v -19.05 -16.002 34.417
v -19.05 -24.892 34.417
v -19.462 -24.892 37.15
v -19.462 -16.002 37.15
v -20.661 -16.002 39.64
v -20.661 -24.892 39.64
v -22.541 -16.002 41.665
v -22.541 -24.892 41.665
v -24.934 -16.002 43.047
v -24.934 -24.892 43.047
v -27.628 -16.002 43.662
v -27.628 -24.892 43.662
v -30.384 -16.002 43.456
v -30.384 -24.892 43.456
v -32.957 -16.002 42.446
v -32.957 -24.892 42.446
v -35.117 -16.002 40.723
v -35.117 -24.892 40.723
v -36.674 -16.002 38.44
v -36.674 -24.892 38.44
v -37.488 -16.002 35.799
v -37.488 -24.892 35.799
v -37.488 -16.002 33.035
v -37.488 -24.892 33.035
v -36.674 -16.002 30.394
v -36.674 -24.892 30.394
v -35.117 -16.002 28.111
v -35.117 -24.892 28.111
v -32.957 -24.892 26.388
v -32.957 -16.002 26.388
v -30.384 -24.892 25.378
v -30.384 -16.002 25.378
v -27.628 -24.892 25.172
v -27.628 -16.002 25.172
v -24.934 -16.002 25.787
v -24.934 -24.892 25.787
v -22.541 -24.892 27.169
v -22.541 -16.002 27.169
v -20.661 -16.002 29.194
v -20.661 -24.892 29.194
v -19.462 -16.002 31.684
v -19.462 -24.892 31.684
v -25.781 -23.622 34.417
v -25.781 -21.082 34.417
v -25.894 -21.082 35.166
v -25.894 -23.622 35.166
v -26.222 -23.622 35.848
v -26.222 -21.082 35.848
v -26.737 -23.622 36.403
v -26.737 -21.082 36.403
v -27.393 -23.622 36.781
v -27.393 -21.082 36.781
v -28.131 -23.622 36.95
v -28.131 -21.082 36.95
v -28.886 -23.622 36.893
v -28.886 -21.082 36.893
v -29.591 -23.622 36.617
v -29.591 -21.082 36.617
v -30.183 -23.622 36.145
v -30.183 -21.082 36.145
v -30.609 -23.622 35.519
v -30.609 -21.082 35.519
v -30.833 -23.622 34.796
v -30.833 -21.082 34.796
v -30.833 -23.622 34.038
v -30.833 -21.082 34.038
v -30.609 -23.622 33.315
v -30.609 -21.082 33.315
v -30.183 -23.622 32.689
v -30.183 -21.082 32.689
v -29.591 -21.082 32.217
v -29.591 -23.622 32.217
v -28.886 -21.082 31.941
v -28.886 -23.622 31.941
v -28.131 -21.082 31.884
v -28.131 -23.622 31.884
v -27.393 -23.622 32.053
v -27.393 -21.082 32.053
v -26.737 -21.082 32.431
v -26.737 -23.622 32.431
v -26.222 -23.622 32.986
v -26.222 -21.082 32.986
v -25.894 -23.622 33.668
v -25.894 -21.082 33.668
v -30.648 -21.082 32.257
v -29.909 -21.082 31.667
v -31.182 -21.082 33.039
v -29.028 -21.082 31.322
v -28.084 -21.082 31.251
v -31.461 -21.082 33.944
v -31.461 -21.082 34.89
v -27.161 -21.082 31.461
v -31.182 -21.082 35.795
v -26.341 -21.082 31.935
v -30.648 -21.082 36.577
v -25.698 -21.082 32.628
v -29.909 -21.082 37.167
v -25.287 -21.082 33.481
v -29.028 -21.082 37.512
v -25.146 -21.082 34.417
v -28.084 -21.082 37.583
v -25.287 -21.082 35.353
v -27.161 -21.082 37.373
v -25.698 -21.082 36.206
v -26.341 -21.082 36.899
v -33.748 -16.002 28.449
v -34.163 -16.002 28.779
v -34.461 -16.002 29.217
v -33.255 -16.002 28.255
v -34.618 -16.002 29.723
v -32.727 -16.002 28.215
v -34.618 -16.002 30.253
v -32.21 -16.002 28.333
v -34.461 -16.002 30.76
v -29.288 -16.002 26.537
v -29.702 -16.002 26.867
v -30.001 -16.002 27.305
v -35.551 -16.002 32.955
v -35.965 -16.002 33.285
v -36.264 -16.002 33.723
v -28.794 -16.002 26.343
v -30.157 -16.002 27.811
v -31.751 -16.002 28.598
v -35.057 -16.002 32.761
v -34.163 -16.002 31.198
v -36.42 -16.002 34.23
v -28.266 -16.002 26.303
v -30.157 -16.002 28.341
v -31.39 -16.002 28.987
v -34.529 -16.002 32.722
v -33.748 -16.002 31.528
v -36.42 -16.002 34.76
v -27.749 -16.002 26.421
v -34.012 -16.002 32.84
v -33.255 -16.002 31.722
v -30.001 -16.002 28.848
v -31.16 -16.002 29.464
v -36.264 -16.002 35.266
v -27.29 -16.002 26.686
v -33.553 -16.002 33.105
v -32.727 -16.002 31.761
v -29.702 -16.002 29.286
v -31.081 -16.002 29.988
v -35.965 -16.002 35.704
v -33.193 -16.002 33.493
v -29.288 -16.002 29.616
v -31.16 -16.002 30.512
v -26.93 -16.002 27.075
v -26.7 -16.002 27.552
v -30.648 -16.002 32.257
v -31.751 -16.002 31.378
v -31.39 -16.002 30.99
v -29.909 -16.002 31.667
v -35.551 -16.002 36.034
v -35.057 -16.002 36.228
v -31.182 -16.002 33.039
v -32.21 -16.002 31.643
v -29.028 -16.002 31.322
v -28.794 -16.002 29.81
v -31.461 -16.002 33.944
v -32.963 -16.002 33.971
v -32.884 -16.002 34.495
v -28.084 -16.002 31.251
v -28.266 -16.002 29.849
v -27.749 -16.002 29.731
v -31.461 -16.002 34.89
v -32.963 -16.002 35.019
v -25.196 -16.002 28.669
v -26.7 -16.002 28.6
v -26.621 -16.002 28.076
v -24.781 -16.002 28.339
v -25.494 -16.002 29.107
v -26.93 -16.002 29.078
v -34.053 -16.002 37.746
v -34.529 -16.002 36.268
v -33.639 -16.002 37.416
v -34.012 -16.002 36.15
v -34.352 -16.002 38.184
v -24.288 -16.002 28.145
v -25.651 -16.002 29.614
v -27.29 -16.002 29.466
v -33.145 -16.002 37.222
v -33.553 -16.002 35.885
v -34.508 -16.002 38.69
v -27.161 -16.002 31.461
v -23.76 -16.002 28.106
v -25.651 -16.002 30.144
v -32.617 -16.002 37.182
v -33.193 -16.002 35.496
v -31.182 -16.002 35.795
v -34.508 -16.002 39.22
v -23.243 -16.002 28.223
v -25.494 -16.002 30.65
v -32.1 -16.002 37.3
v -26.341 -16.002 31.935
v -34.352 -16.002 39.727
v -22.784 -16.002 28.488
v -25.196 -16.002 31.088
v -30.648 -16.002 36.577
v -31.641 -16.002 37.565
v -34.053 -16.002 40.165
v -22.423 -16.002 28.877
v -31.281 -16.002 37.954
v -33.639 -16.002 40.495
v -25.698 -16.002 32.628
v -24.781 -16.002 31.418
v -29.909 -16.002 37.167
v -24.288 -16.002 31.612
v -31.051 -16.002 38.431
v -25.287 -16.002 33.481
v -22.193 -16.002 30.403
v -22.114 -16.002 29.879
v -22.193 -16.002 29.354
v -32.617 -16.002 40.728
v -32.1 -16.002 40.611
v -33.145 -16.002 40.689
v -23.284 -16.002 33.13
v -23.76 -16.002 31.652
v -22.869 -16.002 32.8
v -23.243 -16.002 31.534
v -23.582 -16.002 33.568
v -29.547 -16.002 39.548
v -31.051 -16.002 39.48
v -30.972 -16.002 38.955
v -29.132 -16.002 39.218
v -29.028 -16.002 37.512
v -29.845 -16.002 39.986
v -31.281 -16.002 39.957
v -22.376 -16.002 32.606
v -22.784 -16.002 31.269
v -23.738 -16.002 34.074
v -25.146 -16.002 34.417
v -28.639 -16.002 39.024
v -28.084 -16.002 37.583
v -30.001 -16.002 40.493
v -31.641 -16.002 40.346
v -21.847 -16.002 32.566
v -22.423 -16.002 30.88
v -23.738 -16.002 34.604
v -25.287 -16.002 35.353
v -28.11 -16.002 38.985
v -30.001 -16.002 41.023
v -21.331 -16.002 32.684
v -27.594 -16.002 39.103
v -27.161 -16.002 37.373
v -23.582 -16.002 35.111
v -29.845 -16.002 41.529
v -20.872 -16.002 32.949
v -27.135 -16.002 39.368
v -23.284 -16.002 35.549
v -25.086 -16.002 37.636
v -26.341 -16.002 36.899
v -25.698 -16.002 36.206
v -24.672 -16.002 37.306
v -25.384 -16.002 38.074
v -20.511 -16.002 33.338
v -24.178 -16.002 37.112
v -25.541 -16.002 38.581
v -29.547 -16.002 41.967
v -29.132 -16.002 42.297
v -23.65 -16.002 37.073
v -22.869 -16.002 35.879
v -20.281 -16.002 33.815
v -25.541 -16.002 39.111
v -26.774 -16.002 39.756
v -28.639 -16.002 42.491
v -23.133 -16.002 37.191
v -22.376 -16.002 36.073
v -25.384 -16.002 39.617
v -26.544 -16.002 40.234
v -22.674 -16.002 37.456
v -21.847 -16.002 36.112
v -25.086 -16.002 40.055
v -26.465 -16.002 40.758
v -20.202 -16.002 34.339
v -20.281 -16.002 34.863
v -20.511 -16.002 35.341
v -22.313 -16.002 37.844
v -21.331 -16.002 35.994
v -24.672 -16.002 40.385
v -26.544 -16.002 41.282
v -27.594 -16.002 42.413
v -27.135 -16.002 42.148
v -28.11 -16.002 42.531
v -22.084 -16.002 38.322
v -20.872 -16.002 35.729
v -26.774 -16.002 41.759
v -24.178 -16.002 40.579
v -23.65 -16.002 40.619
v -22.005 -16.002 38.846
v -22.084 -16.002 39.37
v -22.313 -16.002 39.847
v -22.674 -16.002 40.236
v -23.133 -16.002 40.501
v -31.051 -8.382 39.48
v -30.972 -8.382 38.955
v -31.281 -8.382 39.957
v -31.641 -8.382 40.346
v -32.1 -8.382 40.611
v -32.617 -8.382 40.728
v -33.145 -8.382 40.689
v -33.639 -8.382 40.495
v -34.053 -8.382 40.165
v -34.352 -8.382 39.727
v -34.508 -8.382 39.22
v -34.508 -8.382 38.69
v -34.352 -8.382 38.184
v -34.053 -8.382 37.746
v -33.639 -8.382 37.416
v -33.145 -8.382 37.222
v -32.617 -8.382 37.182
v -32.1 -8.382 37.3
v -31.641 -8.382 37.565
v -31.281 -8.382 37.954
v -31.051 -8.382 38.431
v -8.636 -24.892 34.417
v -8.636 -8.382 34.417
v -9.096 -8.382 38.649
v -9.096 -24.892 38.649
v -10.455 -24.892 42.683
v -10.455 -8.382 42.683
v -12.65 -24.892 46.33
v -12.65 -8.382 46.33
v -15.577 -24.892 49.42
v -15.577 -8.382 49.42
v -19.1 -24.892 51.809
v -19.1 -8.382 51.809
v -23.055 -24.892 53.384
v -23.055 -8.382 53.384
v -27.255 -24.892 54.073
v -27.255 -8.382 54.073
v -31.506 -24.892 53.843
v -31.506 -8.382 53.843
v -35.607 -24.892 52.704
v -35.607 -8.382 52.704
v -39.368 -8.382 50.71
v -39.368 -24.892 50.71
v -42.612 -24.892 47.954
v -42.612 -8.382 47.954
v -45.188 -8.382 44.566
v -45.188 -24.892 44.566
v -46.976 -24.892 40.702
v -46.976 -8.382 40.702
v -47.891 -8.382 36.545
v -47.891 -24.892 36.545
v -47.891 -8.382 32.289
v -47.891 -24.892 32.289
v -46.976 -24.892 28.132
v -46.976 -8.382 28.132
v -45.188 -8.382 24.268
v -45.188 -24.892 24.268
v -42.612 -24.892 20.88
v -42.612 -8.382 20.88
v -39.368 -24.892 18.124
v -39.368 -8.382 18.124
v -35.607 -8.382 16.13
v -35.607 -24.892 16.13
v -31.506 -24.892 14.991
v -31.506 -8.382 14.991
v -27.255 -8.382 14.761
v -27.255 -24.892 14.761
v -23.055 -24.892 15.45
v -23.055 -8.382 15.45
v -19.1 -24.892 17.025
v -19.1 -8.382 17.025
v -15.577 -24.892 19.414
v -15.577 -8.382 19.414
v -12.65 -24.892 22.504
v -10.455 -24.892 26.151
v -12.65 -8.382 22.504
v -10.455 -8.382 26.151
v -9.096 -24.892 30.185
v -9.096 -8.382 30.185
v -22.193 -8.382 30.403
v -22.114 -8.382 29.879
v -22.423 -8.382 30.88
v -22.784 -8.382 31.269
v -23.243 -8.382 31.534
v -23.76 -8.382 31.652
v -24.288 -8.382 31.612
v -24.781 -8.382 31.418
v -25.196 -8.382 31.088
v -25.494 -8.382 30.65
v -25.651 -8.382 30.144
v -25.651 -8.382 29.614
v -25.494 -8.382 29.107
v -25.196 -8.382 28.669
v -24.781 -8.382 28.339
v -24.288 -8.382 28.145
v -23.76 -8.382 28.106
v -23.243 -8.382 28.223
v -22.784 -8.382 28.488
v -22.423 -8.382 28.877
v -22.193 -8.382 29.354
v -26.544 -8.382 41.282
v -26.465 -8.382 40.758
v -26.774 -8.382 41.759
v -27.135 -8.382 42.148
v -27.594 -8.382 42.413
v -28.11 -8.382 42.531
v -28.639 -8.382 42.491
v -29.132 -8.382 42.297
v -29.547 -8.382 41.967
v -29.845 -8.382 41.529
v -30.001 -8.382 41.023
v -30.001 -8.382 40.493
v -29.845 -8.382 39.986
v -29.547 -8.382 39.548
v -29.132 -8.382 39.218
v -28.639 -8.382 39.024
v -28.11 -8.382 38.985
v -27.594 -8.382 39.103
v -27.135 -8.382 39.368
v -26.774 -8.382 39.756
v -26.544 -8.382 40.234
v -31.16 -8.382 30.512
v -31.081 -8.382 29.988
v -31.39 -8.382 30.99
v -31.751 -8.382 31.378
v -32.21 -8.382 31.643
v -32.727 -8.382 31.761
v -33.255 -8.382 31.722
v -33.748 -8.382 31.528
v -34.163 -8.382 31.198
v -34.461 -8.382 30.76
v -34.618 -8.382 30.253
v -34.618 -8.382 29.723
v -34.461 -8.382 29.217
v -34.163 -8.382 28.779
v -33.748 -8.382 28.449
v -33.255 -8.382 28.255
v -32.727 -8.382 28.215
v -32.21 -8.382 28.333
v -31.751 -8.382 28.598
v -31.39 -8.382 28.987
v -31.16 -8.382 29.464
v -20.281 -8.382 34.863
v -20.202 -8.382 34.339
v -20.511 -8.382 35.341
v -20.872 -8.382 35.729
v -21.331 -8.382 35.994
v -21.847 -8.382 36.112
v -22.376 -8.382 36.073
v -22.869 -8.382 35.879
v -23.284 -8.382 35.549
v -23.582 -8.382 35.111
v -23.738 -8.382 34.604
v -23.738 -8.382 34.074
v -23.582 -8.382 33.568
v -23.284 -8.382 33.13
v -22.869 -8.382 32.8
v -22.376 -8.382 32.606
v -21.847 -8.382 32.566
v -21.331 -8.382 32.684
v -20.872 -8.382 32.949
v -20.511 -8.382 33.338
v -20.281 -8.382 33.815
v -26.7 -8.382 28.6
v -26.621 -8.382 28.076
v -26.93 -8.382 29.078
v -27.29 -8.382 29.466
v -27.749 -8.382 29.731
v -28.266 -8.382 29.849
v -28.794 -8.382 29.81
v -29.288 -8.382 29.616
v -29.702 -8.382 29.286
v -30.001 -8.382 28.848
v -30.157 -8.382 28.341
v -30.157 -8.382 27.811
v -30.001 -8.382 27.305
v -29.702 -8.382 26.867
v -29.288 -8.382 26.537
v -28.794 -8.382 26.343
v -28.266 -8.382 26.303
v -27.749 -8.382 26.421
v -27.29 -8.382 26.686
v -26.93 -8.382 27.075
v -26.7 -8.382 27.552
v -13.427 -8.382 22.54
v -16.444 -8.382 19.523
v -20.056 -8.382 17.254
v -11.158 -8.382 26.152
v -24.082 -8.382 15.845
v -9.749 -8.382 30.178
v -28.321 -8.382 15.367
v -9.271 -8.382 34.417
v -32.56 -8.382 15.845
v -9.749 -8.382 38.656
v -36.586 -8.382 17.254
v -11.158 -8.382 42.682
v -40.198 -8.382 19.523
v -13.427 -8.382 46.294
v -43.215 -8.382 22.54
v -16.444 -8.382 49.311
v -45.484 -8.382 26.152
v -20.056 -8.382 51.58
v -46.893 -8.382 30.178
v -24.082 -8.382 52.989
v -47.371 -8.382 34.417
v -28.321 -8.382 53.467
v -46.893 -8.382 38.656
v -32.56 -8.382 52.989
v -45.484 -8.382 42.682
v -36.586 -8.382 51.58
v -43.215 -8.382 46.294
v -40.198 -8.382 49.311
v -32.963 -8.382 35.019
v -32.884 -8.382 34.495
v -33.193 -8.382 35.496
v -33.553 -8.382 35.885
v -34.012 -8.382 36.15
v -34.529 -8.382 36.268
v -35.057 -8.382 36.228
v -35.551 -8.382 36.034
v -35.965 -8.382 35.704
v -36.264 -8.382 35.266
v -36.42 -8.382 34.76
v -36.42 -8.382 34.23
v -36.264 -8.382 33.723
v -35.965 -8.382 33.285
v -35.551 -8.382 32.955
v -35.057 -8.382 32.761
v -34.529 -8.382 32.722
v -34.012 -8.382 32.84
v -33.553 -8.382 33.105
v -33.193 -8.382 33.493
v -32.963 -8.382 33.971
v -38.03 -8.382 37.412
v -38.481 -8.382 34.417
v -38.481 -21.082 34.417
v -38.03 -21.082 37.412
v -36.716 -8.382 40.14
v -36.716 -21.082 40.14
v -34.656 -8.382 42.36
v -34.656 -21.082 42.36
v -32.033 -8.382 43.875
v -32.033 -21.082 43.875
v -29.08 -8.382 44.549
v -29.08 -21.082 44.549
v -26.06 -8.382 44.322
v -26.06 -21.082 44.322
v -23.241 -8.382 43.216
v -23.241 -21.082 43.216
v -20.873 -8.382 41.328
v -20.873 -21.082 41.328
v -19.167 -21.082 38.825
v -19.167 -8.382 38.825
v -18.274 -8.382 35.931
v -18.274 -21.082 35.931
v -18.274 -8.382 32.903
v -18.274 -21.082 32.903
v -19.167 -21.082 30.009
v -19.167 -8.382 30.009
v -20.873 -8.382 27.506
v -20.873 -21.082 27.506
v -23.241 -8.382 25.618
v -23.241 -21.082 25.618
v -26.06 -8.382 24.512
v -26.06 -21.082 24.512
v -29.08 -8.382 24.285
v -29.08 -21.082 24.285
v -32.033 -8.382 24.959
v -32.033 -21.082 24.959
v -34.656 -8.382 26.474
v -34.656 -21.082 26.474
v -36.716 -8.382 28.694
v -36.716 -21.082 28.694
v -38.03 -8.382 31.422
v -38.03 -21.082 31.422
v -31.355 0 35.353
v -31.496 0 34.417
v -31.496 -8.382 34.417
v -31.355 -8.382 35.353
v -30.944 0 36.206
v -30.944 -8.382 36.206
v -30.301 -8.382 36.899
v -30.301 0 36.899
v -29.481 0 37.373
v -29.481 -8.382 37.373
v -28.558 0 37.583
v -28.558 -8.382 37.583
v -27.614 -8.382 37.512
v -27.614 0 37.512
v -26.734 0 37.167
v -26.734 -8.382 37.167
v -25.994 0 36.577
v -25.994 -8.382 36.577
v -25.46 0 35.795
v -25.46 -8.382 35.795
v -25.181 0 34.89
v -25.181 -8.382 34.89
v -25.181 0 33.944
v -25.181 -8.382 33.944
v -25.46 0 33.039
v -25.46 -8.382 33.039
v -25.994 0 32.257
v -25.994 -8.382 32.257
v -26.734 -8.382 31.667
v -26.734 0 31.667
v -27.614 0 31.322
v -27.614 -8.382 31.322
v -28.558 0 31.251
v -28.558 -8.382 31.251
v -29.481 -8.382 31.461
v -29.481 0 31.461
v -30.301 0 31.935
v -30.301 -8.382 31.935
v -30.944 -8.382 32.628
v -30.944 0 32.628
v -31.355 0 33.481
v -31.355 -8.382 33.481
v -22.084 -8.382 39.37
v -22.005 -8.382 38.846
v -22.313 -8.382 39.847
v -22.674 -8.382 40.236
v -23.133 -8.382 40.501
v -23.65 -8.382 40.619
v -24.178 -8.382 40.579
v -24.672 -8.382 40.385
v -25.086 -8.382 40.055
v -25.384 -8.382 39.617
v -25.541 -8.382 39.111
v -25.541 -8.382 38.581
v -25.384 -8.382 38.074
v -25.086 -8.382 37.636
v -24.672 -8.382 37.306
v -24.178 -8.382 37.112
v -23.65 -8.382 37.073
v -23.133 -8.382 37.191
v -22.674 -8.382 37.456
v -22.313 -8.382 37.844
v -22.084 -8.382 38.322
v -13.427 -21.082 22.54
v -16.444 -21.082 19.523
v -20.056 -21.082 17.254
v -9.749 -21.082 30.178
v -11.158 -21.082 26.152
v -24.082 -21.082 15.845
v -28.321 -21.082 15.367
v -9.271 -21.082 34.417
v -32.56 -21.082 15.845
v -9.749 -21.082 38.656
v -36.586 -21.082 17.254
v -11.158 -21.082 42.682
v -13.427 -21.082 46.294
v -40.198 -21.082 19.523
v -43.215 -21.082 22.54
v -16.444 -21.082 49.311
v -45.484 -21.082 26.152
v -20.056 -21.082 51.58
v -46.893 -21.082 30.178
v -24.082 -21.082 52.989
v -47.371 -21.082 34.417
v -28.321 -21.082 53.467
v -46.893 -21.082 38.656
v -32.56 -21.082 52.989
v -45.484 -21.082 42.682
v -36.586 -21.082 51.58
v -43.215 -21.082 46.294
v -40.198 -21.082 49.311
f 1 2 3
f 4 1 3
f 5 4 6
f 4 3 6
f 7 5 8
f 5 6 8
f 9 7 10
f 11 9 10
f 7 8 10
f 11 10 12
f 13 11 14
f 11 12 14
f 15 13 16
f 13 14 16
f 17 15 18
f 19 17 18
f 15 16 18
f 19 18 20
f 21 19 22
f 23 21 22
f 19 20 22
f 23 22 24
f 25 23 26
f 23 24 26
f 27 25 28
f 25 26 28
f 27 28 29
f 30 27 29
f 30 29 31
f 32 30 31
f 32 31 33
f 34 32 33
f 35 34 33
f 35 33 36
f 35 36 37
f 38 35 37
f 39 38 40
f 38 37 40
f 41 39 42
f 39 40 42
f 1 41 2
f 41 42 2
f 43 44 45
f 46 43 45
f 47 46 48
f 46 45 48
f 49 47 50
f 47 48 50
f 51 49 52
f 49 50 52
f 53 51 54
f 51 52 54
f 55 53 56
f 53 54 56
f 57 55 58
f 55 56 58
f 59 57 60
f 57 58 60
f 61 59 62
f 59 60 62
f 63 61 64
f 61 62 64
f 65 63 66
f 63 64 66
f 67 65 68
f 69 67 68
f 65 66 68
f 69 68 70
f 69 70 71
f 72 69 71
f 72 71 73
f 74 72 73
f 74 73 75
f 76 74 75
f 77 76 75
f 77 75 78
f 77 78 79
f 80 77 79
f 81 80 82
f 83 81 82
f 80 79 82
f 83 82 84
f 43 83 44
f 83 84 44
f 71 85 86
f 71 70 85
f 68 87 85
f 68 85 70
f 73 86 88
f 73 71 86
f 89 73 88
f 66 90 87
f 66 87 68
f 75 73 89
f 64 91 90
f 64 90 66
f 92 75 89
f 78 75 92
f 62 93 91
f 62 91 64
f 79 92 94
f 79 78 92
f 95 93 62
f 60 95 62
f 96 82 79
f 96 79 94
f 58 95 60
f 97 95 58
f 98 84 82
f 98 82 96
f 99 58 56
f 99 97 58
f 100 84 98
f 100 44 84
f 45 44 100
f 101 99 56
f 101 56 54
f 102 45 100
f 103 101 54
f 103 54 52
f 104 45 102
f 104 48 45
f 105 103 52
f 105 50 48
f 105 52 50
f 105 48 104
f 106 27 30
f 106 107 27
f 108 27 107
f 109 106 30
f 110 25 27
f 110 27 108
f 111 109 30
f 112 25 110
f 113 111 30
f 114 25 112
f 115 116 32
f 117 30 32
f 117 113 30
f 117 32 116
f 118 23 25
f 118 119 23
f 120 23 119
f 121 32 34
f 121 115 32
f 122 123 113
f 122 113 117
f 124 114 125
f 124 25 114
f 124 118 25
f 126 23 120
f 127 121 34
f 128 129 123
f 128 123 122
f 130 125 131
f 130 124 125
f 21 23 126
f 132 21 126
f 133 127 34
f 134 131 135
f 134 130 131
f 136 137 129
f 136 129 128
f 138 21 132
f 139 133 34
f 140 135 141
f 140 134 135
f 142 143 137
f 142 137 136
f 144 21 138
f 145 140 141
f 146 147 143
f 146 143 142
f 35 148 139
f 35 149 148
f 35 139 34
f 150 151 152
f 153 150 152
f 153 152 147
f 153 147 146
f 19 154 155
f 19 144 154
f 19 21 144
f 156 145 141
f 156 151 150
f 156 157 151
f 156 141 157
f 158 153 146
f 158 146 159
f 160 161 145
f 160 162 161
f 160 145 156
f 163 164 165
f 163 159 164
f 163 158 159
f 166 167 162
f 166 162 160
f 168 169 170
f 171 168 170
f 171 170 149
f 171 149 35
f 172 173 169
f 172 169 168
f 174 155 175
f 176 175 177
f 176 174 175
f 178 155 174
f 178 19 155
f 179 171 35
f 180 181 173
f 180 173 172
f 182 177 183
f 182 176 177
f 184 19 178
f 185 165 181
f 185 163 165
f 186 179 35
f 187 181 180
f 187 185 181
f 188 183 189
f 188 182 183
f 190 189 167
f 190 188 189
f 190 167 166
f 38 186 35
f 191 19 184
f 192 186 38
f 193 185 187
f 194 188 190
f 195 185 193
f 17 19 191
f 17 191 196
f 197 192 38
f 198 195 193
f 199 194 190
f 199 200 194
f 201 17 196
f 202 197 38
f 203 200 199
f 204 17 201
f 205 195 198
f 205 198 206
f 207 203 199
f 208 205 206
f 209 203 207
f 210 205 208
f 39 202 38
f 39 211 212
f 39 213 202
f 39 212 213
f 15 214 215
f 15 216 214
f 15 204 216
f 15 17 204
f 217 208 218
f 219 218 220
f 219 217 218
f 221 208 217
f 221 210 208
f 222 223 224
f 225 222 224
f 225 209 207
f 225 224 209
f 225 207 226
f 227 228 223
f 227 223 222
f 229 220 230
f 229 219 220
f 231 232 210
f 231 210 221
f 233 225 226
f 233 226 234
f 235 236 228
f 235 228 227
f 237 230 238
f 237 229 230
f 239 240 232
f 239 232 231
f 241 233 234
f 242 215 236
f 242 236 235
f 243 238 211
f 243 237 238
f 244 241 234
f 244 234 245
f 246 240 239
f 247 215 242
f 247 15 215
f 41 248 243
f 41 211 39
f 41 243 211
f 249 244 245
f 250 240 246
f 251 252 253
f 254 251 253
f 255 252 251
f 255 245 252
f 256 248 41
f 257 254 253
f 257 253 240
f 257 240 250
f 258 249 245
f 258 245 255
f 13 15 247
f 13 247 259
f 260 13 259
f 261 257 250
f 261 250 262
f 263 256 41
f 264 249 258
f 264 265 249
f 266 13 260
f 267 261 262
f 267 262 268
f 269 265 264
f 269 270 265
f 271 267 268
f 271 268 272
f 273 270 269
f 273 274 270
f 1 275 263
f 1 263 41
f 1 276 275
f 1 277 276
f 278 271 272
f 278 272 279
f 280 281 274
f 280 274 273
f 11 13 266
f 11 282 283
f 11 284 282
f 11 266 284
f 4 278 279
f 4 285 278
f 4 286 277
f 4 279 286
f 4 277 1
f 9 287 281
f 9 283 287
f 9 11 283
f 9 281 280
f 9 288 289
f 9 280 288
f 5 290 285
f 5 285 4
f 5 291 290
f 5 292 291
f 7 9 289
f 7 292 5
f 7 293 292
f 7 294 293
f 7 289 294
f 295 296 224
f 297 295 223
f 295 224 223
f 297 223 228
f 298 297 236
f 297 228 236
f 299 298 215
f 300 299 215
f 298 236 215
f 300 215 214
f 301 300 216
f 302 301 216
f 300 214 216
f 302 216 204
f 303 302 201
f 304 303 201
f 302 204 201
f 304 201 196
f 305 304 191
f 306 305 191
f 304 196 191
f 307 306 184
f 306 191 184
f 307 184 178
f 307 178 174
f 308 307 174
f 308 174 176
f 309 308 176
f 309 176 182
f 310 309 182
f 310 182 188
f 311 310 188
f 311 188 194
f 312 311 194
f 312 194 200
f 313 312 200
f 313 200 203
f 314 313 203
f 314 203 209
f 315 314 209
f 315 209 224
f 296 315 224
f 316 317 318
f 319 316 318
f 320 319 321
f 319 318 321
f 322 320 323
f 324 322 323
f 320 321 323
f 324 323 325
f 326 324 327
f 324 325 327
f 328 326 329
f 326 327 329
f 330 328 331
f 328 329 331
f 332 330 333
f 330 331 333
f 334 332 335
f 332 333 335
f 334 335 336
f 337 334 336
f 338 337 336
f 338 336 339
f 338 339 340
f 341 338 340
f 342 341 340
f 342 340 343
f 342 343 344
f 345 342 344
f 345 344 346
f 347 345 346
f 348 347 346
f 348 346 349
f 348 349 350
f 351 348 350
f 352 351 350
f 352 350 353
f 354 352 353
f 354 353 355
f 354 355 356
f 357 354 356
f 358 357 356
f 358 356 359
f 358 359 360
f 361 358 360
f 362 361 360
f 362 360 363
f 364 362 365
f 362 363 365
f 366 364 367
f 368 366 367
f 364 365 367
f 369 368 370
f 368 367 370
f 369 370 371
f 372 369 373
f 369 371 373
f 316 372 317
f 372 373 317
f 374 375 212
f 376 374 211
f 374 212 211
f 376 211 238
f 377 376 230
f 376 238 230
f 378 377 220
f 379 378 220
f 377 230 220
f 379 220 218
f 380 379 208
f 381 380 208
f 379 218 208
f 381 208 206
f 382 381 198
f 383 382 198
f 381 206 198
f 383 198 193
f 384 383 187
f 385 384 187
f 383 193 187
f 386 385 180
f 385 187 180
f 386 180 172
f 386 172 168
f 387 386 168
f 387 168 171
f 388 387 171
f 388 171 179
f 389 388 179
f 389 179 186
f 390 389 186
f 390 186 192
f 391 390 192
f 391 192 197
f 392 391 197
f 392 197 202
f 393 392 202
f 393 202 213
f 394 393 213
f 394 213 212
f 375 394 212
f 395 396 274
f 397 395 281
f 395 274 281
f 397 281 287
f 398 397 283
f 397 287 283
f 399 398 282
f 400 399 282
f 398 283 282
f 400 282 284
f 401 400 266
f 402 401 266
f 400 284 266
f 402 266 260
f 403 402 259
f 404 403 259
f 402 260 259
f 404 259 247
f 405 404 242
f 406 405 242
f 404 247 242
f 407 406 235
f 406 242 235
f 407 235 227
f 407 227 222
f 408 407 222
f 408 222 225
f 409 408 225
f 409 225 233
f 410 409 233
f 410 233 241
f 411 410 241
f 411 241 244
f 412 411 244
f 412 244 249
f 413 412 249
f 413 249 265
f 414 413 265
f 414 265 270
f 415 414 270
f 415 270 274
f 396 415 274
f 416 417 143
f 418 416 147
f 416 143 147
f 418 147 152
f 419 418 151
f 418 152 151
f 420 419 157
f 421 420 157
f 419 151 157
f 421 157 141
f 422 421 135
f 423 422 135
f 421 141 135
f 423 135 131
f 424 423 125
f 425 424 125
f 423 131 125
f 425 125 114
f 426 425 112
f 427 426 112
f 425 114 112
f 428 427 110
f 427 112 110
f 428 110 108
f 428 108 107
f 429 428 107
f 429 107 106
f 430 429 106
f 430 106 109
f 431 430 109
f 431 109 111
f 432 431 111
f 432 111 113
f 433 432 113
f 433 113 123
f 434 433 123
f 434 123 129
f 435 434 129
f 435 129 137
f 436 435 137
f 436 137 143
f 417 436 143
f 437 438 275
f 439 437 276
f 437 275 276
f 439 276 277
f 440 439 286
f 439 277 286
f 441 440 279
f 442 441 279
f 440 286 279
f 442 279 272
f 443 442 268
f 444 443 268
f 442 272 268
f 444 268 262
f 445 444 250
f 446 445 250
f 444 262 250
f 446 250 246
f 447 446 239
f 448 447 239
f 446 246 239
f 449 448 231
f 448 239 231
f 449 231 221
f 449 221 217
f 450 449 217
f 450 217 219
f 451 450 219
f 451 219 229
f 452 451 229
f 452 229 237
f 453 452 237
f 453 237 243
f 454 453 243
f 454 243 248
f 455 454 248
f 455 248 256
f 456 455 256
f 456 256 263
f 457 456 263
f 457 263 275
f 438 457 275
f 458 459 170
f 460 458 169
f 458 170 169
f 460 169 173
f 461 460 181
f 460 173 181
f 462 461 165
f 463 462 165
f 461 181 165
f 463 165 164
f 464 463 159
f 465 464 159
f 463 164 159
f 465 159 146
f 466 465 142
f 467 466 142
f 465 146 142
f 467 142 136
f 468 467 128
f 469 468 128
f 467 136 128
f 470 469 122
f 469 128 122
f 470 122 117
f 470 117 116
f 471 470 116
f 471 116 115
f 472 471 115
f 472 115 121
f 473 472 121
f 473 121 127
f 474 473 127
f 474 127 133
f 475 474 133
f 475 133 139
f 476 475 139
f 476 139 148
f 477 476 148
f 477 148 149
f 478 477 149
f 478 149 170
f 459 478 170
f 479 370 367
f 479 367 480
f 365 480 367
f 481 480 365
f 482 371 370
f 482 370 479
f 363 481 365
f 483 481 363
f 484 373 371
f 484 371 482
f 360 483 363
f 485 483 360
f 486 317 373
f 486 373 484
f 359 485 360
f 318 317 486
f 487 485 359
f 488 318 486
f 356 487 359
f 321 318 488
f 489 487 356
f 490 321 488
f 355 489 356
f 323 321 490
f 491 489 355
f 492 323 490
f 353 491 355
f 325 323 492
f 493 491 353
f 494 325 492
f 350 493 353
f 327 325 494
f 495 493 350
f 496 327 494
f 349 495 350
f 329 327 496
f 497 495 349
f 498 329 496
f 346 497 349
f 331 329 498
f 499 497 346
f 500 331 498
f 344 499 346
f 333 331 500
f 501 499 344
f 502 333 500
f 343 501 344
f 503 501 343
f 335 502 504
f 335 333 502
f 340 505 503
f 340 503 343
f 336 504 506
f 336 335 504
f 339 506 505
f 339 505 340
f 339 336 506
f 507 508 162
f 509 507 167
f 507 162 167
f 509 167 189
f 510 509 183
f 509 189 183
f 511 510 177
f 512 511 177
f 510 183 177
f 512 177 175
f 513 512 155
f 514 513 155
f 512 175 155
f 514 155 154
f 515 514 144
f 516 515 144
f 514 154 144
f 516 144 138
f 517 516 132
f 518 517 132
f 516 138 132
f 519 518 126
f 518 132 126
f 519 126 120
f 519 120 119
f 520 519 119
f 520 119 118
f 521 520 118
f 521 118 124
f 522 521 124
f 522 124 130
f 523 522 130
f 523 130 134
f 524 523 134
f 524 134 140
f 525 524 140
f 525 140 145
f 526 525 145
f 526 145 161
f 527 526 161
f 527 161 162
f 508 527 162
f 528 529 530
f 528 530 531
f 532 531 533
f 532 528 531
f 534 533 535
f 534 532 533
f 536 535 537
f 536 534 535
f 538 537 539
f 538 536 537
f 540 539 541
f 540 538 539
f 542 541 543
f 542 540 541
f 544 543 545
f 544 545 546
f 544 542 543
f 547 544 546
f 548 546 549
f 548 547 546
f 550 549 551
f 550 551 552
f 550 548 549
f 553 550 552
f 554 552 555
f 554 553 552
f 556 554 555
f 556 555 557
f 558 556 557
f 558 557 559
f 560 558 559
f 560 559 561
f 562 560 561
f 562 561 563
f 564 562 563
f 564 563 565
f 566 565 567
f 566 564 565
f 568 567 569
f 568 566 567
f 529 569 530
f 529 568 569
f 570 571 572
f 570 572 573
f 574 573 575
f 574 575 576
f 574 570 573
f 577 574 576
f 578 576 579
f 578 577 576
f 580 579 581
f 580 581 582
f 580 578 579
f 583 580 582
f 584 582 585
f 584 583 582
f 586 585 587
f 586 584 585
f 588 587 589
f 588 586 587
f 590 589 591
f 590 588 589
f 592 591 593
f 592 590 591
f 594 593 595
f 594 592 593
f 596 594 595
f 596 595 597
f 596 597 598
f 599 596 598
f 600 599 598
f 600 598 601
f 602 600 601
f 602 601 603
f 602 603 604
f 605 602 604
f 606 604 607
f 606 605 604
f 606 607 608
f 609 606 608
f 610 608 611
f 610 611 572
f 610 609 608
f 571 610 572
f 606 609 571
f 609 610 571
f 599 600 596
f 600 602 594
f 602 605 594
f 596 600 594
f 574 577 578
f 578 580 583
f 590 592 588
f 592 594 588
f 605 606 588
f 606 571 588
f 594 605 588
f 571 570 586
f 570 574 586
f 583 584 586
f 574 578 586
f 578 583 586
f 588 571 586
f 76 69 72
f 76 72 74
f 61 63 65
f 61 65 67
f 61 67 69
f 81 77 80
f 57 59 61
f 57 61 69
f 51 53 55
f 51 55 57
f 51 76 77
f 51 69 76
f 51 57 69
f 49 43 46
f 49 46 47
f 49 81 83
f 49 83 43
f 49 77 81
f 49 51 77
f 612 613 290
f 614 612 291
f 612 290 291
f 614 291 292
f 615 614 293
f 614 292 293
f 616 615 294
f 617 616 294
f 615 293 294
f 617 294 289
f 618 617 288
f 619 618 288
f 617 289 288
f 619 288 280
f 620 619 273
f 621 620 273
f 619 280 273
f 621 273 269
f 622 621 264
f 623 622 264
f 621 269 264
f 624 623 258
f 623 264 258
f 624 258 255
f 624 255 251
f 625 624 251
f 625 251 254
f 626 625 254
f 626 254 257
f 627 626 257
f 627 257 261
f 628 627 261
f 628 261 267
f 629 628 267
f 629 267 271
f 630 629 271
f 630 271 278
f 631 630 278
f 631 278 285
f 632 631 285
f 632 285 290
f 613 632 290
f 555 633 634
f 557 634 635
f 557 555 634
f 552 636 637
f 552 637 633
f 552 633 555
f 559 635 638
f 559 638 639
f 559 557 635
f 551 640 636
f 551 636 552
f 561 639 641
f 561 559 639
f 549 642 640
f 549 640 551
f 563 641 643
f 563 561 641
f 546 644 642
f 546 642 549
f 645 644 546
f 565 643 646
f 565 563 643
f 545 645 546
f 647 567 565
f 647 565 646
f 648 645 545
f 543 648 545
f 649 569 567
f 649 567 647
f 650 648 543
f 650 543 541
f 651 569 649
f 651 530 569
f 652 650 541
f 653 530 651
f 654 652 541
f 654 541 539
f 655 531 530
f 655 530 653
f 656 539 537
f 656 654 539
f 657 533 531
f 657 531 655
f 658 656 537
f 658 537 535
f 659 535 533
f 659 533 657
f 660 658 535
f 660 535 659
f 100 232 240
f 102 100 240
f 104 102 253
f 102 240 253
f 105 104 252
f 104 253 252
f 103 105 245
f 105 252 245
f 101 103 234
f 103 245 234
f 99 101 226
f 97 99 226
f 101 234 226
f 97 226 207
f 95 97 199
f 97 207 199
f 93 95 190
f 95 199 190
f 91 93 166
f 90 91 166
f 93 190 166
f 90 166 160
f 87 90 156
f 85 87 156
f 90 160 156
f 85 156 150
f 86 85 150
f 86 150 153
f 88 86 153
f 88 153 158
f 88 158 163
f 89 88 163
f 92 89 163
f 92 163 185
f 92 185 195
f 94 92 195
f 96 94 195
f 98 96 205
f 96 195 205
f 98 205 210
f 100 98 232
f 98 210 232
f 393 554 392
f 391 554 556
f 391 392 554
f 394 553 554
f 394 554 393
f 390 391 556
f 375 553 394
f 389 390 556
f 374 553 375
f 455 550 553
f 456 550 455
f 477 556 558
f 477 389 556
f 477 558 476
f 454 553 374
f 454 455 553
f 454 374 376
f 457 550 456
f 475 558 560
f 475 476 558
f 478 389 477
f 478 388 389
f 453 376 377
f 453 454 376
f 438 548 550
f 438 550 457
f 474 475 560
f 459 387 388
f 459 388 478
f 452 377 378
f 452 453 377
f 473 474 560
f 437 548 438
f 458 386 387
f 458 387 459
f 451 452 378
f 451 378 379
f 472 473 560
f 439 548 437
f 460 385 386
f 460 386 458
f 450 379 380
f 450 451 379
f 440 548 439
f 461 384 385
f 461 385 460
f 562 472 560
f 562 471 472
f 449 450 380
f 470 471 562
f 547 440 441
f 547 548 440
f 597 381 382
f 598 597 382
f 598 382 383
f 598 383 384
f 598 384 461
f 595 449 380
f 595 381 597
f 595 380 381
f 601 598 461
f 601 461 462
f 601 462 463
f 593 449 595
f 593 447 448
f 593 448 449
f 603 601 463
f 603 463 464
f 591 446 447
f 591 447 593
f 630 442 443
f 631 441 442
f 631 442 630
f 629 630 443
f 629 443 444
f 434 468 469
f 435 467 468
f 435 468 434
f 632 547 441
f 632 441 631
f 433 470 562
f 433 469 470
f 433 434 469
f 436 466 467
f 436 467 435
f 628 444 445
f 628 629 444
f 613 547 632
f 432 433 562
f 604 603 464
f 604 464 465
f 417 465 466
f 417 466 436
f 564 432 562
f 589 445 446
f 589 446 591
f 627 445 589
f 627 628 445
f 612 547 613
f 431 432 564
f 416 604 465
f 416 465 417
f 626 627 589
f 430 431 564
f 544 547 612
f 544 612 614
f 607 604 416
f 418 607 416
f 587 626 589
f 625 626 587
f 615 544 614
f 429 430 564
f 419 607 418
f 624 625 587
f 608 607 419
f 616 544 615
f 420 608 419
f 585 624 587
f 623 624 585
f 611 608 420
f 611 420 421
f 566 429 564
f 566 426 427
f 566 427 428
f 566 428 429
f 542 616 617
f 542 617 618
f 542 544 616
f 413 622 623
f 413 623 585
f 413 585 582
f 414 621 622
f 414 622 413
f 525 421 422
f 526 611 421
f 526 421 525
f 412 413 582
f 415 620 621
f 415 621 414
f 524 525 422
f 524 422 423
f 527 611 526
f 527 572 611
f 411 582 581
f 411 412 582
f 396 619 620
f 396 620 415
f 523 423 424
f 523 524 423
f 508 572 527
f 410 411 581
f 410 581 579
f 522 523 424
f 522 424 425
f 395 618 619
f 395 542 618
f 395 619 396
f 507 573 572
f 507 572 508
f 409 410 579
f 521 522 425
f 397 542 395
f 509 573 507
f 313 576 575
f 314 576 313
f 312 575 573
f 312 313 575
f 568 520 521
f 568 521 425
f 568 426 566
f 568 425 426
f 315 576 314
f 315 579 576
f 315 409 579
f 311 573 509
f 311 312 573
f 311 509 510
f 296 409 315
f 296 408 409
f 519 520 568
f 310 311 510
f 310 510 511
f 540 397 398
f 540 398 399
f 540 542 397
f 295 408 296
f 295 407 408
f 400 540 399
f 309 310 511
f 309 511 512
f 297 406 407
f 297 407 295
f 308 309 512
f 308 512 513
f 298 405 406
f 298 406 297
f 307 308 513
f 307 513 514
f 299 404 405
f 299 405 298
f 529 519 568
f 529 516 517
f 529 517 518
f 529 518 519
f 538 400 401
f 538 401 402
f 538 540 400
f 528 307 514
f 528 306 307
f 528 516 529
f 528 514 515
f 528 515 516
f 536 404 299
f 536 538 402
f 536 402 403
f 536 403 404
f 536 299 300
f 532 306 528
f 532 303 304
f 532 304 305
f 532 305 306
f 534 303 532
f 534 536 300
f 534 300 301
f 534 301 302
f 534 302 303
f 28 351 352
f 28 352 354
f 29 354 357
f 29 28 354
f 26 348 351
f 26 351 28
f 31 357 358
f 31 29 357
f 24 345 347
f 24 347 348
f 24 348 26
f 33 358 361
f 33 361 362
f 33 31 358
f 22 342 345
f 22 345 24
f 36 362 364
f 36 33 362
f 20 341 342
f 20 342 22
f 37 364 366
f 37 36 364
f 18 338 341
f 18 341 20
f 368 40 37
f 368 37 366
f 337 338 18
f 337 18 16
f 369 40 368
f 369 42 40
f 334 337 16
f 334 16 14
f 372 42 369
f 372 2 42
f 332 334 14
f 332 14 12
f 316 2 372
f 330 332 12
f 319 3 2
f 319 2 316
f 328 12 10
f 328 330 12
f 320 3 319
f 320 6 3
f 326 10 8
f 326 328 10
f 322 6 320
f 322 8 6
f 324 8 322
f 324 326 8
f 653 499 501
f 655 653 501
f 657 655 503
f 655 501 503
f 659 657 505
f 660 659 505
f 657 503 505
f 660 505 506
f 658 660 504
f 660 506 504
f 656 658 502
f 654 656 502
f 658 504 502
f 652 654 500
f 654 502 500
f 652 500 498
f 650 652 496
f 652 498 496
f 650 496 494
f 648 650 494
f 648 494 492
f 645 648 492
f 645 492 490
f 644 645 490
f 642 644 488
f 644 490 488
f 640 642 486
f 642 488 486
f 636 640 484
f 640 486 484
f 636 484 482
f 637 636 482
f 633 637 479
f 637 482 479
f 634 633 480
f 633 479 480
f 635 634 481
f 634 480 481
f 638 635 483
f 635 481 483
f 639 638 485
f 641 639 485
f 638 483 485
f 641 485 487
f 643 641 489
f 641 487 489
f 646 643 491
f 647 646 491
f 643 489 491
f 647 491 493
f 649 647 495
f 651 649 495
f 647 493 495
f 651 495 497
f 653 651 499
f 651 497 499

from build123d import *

# Parameters (mm, degrees)
F0_R      = 19.685
F0_R_2    = 10.16
F0_R_3    = 8.89
F1_DEPTH  = 24.892
F2_R      = 19.685
F2_R_2    = 3.175
F3_DEPTH  = 8.382
F4_R      = 9.271
F5_DEPTH  = 8.89
F6_R      = 3.175
F7_DEPTH  = 5.08
F8_R      = 1.778
F9_DEPTH  = 7.747
F10_R     = 2.54
F11_DEPTH = 2.54
F12_R     = 19.05
F12_R_2   = 10.16
F13_DEPTH = 12.7


with BuildPart() as f1:
    # F0 (on Front) → F1 (new body)
    with BuildSketch(Plane.XZ):
        with Locations((-28.321002, 34.417)):
            Circle(F0_R)
        with Locations((-28.321002, 34.417)):
            Circle(F0_R_2, mode=Mode.SUBTRACT)
        with Locations((-28.321002, 34.417)):
            Circle(F0_R_2)
        with Locations((-28.321002, 34.417)):
            Circle(F0_R_3, mode=Mode.SUBTRACT)
        with Locations((-28.321002, 34.417)):
            Circle(F0_R_3)
    extrude(amount=F1_DEPTH)

    # F2 (on face) → F3 (cut)
    with BuildSketch(Plane(origin=(0, 0, 0), x_dir=(-1, 0, 0), z_dir=(0, 1, 0))):
        with Locations((28.321002, 34.417)):
            Circle(F2_R)
        with Locations((28.321002, 34.417)):
            Circle(F2_R_2, mode=Mode.SUBTRACT)
    extrude(amount=-F3_DEPTH, mode=Mode.SUBTRACT)

    # F4 (on face) → F5 (cut)
    with BuildSketch(Plane.XZ.offset(24.892)):
        with Locations((-28.321002, 34.417)):
            Circle(F4_R)
    extrude(amount=-F5_DEPTH, mode=Mode.SUBTRACT)

    # F6 (on face) → F7 (join)
    with BuildSketch(Plane.XZ.offset(16.002)):
        with Locations((-28.321002, 34.417)):
            Circle(F6_R)
    extrude(amount=F7_DEPTH)

    # F8 (on face) → F9 (cut)
    with BuildSketch(Plane.XZ.offset(16.002)):
        with Locations((-32.749631, 38.955461)):
            Circle(F8_R)
        with Locations((-28.243339, 40.75769)):
            Circle(F8_R)
        with Locations((-23.782541, 38.845629)):
            Circle(F8_R)
        with Locations((-21.980312, 34.339337)):
            Circle(F8_R)
        with Locations((-23.892373, 29.878539)):
            Circle(F8_R)
        with Locations((-28.398665, 28.07631)):
            Circle(F8_R)
        with Locations((-32.859463, 29.988371)):
            Circle(F8_R)
        with Locations((-34.661692, 34.494663)):
            Circle(F8_R)
    extrude(amount=-F9_DEPTH, mode=Mode.SUBTRACT)

    # F10 (on face) → F11 (join)
    with BuildSketch(Plane.XZ.offset(21.082)):
        with Locations((-28.321002, 34.417)):
            Circle(F10_R)
    extrude(amount=F11_DEPTH)

    # F12 (on face) → F13 (cut)
    with BuildSketch(Plane(origin=(0, -8.382, 0), x_dir=(-1, 0, 0), z_dir=(0, 1, 0))):
        with Locations((28.321002, 34.417)):
            Circle(F12_R)
        with Locations((28.321002, 34.417)):
            Circle(F12_R_2, mode=Mode.SUBTRACT)
    extrude(amount=-F13_DEPTH, mode=Mode.SUBTRACT)


solid = f1.part
